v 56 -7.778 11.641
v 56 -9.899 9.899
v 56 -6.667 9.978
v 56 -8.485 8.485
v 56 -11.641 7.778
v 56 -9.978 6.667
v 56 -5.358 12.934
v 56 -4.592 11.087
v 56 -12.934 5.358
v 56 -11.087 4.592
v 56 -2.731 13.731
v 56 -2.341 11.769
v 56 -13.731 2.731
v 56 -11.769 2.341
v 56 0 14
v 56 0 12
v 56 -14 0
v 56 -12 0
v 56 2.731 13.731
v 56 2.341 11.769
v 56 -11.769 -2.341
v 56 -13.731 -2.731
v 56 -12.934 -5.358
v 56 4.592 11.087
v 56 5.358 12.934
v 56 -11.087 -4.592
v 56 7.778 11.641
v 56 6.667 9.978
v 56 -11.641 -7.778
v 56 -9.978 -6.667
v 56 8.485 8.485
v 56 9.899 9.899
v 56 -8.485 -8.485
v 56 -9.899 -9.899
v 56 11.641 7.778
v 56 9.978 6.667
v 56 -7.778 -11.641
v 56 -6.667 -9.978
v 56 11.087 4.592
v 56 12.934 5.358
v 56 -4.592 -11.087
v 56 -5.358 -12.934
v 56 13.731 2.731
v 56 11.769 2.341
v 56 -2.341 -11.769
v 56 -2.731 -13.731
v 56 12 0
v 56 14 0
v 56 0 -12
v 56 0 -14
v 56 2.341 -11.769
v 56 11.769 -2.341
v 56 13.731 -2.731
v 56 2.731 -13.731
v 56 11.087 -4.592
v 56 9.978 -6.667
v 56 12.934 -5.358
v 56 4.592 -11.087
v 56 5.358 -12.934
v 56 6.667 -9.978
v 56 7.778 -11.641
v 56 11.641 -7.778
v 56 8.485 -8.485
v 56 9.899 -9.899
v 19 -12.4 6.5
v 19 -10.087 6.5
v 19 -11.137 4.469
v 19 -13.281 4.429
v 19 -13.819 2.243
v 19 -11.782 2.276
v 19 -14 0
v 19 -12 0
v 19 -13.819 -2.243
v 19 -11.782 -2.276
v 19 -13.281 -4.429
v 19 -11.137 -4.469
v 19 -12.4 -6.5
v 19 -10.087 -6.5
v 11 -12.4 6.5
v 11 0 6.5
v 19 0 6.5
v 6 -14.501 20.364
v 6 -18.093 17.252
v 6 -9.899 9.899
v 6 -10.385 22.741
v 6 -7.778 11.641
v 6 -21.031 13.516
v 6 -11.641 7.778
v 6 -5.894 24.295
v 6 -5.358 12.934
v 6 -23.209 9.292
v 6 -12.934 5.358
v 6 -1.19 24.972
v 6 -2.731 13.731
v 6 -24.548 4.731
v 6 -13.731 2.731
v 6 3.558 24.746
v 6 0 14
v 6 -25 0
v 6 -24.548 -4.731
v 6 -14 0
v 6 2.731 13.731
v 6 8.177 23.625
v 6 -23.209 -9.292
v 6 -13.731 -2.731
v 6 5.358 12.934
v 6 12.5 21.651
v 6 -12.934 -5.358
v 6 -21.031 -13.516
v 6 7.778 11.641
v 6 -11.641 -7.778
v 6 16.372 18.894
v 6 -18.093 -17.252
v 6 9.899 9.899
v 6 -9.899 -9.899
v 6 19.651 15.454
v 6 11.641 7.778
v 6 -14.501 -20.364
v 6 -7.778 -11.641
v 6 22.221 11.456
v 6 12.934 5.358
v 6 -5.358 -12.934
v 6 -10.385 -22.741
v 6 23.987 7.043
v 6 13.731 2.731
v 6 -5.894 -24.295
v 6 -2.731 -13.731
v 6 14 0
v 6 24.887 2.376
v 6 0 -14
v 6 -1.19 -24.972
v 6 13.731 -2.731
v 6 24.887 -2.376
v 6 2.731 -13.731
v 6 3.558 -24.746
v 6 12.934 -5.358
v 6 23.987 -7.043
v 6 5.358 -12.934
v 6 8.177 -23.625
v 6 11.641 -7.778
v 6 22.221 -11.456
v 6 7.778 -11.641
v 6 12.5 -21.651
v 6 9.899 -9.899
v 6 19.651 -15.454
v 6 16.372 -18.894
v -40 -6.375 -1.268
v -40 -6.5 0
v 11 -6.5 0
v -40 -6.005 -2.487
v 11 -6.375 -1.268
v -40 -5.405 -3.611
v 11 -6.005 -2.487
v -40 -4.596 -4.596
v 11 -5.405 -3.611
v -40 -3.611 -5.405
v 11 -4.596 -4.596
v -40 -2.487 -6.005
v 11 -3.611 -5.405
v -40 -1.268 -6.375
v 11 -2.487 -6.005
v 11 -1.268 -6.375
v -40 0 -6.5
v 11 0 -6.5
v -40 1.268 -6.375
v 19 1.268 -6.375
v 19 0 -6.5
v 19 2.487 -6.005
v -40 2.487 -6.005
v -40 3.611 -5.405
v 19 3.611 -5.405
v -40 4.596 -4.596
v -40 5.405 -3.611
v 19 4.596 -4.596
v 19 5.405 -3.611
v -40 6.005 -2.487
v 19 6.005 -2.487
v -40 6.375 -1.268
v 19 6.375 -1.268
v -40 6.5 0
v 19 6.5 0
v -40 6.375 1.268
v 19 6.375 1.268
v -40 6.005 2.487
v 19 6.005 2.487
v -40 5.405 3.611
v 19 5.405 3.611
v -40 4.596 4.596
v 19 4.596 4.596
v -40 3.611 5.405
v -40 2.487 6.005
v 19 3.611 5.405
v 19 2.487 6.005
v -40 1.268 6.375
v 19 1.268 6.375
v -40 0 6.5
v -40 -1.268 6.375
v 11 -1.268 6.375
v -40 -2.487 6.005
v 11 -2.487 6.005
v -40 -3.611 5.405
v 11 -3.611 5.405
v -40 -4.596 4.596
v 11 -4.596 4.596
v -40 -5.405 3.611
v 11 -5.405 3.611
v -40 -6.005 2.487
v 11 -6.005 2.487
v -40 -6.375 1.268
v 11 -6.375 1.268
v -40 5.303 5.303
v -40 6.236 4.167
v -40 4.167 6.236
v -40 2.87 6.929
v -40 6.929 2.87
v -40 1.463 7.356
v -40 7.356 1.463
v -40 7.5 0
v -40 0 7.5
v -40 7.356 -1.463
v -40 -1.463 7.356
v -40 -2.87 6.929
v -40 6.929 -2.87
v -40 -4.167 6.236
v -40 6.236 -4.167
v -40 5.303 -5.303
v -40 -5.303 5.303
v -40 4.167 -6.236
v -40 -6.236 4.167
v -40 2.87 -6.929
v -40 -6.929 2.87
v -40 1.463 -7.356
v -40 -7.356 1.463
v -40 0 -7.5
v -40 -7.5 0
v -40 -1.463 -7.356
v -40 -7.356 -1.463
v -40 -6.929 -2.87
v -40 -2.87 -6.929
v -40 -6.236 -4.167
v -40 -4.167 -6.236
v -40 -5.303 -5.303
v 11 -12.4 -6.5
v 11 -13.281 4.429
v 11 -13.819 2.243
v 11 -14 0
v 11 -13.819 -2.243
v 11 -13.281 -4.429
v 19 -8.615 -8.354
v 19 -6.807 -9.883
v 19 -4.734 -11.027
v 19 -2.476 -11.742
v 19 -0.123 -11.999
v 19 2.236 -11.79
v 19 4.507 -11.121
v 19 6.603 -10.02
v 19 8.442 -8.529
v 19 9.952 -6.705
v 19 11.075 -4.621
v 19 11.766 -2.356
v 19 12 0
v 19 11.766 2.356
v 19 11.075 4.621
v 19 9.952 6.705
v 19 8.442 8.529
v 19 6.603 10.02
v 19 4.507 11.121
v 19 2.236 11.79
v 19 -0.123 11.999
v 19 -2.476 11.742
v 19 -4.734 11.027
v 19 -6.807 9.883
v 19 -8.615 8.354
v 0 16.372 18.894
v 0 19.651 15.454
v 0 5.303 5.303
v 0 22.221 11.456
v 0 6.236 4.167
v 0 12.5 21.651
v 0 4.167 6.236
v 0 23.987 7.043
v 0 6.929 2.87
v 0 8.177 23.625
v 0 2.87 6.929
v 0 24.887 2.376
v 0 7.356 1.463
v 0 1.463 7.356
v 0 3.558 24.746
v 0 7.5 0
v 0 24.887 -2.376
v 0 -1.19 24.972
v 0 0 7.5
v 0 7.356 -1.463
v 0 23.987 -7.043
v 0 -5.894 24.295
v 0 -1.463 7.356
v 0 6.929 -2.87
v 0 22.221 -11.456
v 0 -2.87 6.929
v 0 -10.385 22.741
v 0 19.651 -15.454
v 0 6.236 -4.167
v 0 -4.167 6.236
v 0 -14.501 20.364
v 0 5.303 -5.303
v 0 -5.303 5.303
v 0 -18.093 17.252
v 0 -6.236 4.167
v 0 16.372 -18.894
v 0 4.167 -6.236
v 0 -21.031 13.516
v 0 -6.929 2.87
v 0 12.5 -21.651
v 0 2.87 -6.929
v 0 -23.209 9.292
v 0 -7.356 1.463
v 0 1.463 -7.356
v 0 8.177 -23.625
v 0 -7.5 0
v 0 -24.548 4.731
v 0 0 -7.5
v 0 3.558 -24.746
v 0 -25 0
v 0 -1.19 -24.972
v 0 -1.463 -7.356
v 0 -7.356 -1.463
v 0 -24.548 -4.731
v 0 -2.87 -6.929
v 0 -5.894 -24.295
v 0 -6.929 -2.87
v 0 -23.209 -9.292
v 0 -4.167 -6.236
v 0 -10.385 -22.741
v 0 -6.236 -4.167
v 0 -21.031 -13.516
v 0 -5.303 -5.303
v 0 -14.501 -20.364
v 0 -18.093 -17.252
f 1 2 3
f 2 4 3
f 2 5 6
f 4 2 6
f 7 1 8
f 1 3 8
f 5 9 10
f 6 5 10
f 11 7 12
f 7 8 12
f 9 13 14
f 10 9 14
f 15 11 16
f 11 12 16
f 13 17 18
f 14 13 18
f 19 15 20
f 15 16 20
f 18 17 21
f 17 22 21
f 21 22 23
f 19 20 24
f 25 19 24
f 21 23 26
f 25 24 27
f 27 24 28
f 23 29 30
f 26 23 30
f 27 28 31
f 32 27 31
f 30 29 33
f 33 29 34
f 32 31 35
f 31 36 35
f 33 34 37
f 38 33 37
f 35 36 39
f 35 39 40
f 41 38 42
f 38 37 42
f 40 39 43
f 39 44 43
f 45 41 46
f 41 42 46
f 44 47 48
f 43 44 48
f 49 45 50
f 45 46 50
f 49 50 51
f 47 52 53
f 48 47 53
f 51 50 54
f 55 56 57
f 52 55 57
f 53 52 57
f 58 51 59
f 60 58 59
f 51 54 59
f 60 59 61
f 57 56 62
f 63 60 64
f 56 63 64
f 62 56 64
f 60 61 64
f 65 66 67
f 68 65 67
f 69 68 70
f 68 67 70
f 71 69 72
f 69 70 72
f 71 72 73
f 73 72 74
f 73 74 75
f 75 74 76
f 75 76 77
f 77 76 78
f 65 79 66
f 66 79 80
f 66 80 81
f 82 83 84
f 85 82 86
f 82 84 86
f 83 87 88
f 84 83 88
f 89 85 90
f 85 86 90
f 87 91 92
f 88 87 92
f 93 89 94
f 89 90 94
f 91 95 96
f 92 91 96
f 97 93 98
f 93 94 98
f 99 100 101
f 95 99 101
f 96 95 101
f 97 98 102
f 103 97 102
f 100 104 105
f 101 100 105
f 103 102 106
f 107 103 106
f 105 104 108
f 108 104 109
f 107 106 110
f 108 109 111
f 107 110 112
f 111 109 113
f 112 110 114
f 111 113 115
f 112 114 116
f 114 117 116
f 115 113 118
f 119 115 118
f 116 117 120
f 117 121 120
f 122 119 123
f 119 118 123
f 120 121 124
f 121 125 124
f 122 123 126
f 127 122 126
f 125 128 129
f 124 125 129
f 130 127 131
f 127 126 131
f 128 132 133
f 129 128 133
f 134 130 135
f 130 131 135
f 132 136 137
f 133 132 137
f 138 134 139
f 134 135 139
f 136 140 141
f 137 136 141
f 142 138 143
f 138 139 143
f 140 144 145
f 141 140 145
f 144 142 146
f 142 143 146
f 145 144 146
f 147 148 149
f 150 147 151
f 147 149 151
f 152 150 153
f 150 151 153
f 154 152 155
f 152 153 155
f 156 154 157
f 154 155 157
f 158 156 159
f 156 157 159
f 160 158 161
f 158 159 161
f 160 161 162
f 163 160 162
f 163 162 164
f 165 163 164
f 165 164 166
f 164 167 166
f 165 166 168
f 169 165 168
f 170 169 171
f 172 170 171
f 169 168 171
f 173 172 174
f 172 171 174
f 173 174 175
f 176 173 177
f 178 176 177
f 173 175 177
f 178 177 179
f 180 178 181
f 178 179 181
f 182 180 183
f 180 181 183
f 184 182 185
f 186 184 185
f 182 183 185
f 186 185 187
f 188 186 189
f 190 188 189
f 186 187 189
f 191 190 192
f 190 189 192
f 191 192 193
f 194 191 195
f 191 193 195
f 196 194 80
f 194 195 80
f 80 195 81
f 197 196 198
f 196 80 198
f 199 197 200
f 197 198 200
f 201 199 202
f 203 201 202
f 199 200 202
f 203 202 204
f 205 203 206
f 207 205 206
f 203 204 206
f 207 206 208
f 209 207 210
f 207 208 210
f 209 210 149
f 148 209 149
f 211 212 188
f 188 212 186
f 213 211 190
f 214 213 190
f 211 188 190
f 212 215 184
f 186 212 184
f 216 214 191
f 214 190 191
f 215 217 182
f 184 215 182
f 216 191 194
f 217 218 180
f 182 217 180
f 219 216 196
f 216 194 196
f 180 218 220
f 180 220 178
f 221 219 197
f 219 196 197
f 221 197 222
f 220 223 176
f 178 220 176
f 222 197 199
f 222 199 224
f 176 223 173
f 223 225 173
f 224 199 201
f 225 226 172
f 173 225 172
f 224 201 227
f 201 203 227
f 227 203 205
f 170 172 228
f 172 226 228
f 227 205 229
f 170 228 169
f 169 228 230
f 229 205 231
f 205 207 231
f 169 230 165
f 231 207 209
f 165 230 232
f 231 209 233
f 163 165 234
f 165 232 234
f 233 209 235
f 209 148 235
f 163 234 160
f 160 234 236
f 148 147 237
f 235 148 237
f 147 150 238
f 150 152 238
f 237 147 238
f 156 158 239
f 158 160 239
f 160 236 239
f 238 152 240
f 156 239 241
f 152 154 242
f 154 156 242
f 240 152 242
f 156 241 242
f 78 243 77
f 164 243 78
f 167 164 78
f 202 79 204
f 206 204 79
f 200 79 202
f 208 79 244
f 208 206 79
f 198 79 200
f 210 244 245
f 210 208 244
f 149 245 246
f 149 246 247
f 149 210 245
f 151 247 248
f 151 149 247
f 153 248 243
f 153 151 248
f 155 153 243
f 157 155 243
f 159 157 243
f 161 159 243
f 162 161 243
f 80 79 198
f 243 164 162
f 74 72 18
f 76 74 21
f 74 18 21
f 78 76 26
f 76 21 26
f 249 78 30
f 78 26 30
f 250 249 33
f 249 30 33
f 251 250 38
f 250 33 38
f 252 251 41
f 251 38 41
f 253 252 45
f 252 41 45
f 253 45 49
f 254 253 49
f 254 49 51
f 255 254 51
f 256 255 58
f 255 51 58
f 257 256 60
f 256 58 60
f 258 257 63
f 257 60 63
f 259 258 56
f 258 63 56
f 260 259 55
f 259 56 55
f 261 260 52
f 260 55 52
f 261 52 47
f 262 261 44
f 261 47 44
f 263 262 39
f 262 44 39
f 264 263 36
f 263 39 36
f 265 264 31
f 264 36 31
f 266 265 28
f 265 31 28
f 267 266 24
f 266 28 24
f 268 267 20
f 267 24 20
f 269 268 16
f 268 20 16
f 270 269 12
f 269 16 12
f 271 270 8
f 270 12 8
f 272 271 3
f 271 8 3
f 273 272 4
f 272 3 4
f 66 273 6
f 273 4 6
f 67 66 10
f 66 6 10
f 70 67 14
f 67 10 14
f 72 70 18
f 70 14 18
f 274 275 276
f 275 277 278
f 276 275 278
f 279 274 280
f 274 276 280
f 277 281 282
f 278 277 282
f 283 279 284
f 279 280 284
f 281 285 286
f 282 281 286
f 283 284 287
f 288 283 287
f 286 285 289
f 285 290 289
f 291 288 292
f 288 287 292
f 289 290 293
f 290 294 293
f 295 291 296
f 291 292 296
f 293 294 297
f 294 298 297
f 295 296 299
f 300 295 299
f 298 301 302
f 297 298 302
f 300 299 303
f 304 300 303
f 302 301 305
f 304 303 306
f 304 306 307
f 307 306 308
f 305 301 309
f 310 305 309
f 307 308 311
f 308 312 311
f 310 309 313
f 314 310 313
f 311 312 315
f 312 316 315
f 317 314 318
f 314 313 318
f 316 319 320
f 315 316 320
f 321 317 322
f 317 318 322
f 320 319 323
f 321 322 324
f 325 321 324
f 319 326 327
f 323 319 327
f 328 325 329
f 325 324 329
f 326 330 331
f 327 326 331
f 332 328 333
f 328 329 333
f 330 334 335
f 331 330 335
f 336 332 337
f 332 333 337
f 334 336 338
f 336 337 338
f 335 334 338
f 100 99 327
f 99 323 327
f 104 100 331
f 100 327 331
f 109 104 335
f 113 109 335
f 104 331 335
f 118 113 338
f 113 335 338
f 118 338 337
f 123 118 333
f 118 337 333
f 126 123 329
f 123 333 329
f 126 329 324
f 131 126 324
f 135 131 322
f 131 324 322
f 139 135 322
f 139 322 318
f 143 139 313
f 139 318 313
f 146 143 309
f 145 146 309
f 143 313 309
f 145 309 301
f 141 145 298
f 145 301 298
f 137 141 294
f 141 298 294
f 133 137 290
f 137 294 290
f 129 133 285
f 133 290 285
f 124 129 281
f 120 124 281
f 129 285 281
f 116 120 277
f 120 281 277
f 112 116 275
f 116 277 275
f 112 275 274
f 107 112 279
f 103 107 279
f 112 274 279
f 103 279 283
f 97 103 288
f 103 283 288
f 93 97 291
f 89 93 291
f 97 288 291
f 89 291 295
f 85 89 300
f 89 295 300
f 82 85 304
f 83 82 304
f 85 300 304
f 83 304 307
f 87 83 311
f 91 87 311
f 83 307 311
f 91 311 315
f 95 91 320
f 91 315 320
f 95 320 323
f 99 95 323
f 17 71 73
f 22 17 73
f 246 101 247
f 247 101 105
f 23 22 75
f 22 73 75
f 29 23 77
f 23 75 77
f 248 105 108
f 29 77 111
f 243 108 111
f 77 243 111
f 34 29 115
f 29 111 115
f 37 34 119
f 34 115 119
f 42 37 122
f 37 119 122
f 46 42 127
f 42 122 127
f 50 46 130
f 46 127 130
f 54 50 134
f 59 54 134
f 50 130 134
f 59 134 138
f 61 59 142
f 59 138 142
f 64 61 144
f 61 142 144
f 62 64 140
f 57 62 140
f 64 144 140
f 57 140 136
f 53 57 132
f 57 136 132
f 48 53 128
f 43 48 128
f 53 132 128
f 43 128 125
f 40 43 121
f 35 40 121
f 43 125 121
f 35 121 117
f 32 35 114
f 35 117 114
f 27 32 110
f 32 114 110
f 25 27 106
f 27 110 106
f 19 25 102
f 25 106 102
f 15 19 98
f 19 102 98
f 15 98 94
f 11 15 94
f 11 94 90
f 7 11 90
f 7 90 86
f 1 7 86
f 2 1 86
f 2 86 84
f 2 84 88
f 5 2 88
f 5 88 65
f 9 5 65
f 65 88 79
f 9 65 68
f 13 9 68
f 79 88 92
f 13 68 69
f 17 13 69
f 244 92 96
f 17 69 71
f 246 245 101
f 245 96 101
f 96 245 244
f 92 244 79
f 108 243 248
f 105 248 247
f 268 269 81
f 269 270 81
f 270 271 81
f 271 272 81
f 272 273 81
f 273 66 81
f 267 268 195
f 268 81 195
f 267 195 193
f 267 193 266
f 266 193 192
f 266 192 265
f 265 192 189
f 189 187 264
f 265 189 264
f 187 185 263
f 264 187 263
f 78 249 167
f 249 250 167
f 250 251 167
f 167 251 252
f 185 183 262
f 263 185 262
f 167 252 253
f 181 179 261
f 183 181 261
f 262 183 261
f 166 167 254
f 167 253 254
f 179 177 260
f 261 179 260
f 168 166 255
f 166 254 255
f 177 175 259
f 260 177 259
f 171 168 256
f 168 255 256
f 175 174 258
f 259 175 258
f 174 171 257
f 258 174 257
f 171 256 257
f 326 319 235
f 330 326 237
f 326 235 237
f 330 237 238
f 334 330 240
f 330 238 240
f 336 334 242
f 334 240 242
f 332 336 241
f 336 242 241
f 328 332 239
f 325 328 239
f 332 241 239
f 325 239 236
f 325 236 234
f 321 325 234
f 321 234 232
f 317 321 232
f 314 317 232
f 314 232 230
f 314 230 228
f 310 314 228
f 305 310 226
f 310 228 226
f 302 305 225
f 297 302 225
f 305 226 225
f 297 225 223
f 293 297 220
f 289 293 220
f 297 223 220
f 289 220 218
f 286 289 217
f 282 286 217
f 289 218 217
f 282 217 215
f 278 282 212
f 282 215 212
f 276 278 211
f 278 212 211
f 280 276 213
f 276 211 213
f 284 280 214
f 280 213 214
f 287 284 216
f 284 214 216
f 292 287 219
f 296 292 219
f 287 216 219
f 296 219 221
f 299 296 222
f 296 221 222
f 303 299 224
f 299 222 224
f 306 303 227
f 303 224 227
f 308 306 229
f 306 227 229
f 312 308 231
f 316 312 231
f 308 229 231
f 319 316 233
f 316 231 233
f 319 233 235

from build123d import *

# Parameters (mm, degrees)
CUT_EXTRUDE1_REACH = 68.227
SKETCH4_W          = 8
SKETCH4_H          = 13


with BuildPart() as part:
    # Sketch1 → Revolve1 (revolve)
    with BuildSketch(Plane.XY, mode=Mode.PRIVATE) as revolve1_sk:
        Polygon((0, 25), (0, 7.5), (-40, 7.5), (-40, 6.5), (19, 6.5), (19, 12), (56, 12), (56, 14), (6, 14), (6, 25), align=None)
    revolve(revolve1_sk.sketch.rotate(Axis((-64.900117457, 0, 0), (1, 0, 0)), 180), axis=Axis((-64.900117457, 0, 0), (1, 0, 0)))

    # Sketch4 → Cut-Extrude1 (cut, up to next)
    with BuildSketch(Plane(origin=(0, 0, 0), x_dir=(1, 0, 0), z_dir=(0, 1, 0)), mode=Mode.PRIVATE) as cut_extrude1_sk1:
        with Locations((15, 0)):
            Rectangle(SKETCH4_W, SKETCH4_H)
    cut_extrude1_tool1 = extrude(cut_extrude1_sk1.sketch, amount=-CUT_EXTRUDE1_REACH, mode=Mode.PRIVATE) & part.part
    add(cut_extrude1_tool1.solids().sort_by_distance((15, 0, 0))[0], mode=Mode.SUBTRACT)


solid = part.part
